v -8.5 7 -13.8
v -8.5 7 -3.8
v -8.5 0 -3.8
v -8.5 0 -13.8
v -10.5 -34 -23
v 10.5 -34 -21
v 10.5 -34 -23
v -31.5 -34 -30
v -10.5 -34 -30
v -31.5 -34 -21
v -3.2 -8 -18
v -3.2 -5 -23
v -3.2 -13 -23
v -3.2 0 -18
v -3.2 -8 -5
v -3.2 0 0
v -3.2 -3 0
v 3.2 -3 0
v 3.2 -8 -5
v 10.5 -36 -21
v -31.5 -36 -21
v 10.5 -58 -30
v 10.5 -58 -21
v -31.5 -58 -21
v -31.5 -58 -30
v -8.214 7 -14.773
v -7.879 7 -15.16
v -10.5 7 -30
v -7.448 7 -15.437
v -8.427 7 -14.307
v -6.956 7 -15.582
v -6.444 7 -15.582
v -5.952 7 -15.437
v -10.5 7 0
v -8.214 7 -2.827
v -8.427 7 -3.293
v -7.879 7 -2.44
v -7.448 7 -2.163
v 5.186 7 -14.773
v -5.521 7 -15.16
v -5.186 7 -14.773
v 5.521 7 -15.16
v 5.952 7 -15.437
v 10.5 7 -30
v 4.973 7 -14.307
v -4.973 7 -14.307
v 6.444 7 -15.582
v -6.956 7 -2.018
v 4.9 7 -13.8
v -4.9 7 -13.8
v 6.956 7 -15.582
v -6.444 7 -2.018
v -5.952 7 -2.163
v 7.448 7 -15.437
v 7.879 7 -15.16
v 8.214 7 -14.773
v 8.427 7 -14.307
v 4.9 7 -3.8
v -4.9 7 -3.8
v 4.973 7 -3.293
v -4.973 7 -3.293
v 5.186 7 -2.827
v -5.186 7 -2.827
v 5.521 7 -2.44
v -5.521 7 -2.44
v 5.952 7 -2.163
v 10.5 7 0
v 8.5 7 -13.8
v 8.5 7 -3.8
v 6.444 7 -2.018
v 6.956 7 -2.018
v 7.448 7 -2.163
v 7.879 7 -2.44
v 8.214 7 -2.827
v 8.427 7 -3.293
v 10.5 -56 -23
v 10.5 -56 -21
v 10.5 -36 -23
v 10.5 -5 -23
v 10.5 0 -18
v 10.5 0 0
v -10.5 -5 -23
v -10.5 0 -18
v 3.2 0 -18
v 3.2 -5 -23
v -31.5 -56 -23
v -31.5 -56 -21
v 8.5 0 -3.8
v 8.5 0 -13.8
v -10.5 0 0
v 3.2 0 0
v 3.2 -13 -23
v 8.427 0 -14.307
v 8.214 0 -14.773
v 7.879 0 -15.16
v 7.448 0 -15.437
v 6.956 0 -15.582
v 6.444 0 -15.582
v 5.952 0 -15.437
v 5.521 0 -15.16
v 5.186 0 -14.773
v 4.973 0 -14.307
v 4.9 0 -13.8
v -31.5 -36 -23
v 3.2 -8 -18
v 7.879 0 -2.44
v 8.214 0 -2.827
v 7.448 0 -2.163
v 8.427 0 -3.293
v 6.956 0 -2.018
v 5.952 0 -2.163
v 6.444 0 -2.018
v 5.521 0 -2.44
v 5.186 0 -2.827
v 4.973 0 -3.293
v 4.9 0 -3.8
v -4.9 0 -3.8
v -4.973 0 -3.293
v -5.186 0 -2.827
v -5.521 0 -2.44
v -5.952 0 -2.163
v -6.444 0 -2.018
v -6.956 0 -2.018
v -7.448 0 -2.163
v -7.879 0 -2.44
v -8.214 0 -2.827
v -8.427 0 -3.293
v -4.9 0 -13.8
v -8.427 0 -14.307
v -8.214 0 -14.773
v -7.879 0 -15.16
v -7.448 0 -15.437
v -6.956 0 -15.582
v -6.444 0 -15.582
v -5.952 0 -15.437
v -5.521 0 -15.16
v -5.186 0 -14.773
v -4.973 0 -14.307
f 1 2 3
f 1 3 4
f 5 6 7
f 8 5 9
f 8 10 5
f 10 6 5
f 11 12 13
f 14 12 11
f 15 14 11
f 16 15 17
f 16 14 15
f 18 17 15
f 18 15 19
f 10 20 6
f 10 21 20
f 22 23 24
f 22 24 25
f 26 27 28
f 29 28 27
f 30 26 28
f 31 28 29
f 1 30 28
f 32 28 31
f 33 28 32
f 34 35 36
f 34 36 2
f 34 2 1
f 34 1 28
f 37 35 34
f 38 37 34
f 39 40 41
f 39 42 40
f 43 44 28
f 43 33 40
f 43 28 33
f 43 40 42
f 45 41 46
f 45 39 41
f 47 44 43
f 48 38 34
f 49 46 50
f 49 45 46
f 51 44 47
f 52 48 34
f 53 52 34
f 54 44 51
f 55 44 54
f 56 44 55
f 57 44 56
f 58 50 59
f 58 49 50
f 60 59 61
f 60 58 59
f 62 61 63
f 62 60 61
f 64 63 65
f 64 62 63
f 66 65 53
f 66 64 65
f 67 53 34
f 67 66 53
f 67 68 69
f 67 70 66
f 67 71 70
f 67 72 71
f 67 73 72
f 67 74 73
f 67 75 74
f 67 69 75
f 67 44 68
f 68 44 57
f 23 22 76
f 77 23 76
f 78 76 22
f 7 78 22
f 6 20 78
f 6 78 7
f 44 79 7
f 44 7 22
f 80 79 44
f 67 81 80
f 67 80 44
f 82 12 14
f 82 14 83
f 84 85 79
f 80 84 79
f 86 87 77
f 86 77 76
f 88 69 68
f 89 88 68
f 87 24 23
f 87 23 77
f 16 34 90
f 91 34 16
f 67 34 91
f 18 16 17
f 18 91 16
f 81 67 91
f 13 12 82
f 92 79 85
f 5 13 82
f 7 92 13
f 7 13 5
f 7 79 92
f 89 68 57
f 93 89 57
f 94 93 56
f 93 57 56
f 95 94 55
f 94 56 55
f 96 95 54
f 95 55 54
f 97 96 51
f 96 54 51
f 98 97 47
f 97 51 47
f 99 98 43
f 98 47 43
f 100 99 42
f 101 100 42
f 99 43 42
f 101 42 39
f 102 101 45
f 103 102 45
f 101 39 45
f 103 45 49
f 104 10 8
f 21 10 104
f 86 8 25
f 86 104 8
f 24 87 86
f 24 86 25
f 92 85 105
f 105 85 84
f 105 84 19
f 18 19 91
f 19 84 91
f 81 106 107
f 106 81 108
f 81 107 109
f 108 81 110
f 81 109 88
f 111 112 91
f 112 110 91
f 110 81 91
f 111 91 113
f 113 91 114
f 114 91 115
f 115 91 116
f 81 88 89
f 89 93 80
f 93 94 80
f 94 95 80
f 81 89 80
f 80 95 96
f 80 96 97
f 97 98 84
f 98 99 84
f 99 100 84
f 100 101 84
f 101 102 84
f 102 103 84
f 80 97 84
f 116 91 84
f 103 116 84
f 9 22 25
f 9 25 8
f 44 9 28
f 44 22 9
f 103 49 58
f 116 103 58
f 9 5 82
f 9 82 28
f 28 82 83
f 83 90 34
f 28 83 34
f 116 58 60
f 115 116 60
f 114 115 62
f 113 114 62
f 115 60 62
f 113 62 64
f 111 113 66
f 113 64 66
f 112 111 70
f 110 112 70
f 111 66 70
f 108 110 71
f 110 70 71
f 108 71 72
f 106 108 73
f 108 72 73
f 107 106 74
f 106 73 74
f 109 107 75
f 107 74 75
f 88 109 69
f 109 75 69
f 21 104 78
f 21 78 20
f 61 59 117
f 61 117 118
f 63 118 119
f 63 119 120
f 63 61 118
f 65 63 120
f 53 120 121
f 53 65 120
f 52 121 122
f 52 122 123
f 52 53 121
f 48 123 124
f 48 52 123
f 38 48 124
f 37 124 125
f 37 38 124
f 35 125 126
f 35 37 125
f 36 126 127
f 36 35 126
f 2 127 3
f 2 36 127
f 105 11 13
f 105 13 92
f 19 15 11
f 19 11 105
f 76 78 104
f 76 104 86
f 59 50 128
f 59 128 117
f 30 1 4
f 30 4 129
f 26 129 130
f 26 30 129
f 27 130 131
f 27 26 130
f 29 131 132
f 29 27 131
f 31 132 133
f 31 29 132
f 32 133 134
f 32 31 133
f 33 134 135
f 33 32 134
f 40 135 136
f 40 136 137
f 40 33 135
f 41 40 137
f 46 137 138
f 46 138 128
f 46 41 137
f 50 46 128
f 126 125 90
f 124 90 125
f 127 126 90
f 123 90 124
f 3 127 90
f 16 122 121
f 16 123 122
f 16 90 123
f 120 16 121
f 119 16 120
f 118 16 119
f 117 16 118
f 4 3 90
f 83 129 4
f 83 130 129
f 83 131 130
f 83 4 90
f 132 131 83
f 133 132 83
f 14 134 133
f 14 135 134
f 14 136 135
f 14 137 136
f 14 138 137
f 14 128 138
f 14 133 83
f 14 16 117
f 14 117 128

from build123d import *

# Parameters (mm, degrees)
F1_DEPTH = 10.5
F3_DEPTH = 25
F2_W     = 3.2
F2_H     = 23
F4_DEPTH = 15
F5_SIZE  = 5
F8_DEPTH = 21


with BuildPart() as f1:
    # F0 (on Right) → F1 (new body)
    with BuildSketch(Plane.YZ):
        Polygon((0, 0), (0, -23), (-46.5, -23), (-51, -23), (-58, -23), (-58, -30), (7, -30), (7, 0), align=None)
    extrude(amount=F1_DEPTH)

    # F2 (on face) → F3 (cut)
    with BuildSketch(Plane(origin=(0, 7, 0), x_dir=(-1, 0, 0), z_dir=(0, 1, 0))):
        with BuildLine():
            Line((-4.9, -13.8), (-4.9, -3.8))
            ThreePointArc((-4.9, -3.8), (-6.7, -2), (-8.5, -3.8))
            Line((-8.5, -3.8), (-8.5, -13.8))
            ThreePointArc((-8.5, -13.8), (-6.7, -15.6), (-4.9, -13.8))
        make_face()
    extrude(amount=-F3_DEPTH, mode=Mode.SUBTRACT)

    # F2 (on face) → F4 (join)
    with BuildSketch(Plane(origin=(0, 7, 0), x_dir=(-1, 0, 0), z_dir=(0, 1, 0))):
        with Locations((-1.6, -11.5)):
            Rectangle(F2_W, F2_H)
    extrude(amount=-F4_DEPTH)

    # F5
    f5_edges = [f1.edges().sort_by_distance(p)[0] for p in [
        (1.6, -8, -23),
        (1.6, -8, 0),
        (6.85, 0, -23),
    ]]
    chamfer(f5_edges, length=F5_SIZE)

    # F6: F1 across face


with BuildPart() as f1_1:
    add(f1.part)
    add(f1.part.mirror(Plane(origin=(0, -14.7708333333, -20.3385416667), x_dir=(0, -1, 0), z_dir=(-1, 0, 0))))

    # F7 (on face) → F8 (join, symmetric)
    with BuildSketch(Plane(origin=(-10.5, 0, 0), x_dir=(0, -1, 0), z_dir=(-1, 0, 0))):
        Polygon((34, -30), (58, -30), (58, -21), (56, -21), (56, -23), (36, -23), (36, -21), (34, -21), align=None)
    extrude(amount=F8_DEPTH, both=True)


solid = f1_1.part
